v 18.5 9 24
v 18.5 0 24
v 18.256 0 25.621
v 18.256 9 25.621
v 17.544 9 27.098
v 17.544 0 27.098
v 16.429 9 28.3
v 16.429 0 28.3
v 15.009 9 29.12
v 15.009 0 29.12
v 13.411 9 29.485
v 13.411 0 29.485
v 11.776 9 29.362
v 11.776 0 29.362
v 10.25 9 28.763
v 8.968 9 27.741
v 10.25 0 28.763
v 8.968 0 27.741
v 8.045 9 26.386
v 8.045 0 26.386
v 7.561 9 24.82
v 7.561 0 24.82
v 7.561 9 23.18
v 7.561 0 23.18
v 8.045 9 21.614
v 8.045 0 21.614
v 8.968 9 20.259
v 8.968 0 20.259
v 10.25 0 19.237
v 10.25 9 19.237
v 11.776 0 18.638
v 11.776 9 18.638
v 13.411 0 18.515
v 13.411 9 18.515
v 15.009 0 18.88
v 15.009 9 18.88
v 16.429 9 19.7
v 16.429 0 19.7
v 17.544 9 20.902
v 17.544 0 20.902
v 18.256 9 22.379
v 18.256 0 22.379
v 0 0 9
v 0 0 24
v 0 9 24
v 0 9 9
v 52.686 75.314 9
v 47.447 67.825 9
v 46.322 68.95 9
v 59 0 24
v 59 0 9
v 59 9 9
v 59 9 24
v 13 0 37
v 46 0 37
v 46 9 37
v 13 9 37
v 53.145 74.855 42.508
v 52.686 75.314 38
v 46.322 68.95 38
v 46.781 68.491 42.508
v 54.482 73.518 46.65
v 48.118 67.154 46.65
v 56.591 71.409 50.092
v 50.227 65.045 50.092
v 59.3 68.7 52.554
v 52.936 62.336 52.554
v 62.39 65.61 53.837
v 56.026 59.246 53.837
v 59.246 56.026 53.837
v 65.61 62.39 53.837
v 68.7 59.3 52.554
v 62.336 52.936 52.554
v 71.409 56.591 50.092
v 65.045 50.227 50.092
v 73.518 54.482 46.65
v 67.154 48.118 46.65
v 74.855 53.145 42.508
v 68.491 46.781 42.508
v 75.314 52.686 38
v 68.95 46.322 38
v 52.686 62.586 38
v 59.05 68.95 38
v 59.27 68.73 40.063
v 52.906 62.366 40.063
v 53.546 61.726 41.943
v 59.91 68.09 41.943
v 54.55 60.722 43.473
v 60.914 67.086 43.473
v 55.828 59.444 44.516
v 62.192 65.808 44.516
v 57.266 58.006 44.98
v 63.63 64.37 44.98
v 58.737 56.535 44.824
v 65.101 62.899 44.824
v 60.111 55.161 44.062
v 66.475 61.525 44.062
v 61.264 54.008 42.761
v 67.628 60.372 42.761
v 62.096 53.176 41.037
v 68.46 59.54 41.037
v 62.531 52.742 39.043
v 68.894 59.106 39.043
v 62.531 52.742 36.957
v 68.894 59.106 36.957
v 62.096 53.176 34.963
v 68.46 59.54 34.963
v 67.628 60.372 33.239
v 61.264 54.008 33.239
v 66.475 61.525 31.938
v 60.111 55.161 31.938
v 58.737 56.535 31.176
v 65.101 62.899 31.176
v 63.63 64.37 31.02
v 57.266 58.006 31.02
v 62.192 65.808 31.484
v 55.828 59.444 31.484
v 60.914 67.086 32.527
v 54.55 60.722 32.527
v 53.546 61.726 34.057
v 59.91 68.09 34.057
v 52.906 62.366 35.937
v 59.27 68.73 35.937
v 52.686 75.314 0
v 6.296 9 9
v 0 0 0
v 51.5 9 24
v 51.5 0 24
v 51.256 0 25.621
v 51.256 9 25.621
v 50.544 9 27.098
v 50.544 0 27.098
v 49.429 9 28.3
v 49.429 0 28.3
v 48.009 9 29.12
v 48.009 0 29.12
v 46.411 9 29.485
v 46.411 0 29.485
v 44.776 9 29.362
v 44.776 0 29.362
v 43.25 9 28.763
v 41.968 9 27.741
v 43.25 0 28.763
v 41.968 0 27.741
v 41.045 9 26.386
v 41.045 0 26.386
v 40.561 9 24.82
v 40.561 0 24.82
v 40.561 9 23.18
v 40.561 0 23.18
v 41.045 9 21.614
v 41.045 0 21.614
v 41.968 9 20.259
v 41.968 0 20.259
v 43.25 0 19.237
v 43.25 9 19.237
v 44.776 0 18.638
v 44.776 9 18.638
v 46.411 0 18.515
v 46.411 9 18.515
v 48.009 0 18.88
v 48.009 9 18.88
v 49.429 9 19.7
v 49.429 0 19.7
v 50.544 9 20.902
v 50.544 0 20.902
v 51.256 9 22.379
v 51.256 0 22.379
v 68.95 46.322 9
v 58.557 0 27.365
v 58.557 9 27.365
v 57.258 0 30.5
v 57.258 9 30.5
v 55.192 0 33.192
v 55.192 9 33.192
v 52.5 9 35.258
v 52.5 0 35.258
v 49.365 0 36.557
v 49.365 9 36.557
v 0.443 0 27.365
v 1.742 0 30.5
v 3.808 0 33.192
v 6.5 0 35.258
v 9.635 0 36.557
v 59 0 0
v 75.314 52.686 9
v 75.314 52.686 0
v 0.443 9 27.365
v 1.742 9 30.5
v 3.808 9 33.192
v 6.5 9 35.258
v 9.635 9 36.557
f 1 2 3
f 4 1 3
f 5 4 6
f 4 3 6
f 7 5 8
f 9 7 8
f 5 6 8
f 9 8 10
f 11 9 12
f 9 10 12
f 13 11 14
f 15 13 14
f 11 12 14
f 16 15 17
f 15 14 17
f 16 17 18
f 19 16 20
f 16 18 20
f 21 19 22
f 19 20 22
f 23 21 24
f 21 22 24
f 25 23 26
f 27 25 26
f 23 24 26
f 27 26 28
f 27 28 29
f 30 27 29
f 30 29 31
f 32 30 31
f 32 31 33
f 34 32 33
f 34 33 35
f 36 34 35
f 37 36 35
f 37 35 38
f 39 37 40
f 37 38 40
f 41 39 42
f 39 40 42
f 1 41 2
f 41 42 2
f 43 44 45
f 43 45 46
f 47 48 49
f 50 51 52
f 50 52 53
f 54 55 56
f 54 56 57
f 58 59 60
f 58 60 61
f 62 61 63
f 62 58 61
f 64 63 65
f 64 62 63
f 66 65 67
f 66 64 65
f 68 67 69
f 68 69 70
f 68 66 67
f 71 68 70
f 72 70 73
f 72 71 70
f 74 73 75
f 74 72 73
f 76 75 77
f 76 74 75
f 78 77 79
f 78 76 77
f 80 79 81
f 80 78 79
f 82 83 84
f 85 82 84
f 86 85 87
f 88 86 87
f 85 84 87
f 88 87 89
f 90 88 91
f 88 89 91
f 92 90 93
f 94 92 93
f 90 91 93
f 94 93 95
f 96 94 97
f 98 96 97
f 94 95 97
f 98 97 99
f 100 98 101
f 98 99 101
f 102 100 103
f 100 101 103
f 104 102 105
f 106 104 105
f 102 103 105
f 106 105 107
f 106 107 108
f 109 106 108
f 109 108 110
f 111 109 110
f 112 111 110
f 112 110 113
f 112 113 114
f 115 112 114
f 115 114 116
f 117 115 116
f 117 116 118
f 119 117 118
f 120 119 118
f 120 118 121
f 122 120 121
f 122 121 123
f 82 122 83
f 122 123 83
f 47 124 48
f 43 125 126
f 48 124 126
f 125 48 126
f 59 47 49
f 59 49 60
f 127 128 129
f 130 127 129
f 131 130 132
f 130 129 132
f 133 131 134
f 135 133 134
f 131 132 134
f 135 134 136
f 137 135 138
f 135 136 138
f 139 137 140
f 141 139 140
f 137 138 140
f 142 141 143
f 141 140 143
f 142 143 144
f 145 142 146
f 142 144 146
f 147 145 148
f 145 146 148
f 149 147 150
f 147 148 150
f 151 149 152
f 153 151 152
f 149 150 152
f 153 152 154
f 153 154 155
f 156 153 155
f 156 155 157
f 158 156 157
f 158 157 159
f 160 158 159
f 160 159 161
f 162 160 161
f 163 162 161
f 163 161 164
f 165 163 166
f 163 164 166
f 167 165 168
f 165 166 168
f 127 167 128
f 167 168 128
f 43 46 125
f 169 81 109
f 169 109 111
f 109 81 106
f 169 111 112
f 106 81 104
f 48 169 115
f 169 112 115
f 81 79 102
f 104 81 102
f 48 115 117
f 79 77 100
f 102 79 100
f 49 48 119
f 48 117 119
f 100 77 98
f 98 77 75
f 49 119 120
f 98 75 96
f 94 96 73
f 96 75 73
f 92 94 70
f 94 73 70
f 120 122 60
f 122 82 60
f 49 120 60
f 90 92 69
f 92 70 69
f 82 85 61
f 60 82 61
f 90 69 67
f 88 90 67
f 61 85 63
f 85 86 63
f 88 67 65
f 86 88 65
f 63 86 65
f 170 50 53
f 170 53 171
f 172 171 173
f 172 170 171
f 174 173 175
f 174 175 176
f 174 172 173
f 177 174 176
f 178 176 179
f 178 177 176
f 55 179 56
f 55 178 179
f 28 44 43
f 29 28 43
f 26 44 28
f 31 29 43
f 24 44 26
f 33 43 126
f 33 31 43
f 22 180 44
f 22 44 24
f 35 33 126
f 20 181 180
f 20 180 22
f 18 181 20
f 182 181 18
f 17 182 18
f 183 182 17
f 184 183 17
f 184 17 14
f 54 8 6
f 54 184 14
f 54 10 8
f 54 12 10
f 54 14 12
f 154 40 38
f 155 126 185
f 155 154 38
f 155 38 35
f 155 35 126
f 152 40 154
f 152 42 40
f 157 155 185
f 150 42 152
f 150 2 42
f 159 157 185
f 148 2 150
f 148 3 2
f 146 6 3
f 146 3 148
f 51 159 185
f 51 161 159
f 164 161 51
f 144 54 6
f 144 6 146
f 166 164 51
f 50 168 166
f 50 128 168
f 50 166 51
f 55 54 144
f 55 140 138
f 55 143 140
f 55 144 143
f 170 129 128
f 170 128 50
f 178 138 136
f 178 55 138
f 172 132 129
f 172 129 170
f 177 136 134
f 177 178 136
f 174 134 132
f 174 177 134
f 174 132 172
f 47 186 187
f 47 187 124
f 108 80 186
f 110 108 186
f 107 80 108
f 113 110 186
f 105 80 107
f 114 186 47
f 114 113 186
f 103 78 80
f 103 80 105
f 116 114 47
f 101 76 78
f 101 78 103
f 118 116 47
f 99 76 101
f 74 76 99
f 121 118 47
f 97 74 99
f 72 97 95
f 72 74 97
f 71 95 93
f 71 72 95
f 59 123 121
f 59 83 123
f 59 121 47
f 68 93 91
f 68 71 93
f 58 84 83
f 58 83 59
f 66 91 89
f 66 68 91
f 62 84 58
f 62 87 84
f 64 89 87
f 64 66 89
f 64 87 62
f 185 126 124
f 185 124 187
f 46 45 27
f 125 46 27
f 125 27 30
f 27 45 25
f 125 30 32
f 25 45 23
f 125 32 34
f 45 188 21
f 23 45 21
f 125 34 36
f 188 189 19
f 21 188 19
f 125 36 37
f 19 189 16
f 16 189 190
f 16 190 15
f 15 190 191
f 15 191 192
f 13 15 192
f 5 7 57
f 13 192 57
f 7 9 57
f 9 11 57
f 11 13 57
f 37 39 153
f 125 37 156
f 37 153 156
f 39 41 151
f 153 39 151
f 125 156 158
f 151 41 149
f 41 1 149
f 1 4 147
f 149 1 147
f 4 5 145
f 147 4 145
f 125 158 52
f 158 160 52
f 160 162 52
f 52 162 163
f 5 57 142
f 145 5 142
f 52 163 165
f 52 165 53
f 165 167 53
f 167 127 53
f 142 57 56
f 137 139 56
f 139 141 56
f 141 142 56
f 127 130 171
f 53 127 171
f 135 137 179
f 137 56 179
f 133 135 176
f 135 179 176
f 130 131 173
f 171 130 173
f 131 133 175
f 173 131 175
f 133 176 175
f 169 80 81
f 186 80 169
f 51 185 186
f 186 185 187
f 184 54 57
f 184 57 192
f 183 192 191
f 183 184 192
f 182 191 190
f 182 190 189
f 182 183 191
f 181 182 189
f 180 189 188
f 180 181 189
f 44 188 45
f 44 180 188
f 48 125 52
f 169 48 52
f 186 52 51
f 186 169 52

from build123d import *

# Parameters (mm, degrees)
F1_DEPTH = 9
F2_R     = 7
F3_DEPTH = 9
F4_R     = 5.5
F5_DEPTH = 9


with BuildPart() as f1:
    # F0 (on Top) → F1 (new body)
    with BuildSketch(Plane.XY):
        Polygon((52.686291501, 75.313708499), (0, 0), (59, 0), (75.313708499, 52.686291501), align=None)
    extrude(amount=F1_DEPTH)

    # F2 (on face) → F3 (join)
    with BuildSketch(Plane(origin=(64, 64, 0), x_dir=(-0.7071067812, 0.7071067812, 0), z_dir=(0.7071067812, 0.7071067812, 0))):
        with BuildLine():
            Line((-16, 38), (-16, 9))
            Line((-16, 9), (16, 9))
            Line((16, 9), (16, 38))
            ThreePointArc((16, 38), (0, 54), (-16, 38))
        make_face()
        with Locations((0, 38)):
            Circle(F2_R, mode=Mode.SUBTRACT)
    extrude(amount=-F3_DEPTH)

    # F4 (on face) → F5 (join)
    with BuildSketch(Plane.XZ):
        with BuildLine():
            Line((0, 24), (0, 9))
            Line((0, 9), (59, 9))
            Line((59, 9), (59, 24))
            ThreePointArc((59, 24), (55.1923881554, 33.1923881554), (46, 37))
            Line((46, 37), (13, 37))
            ThreePointArc((13, 37), (3.8076118446, 33.1923881554), (0, 24))
        make_face()
        with Locations((13, 24)):
            Circle(F4_R, mode=Mode.SUBTRACT)
        with Locations((46, 24)):
            Circle(F4_R, mode=Mode.SUBTRACT)
    extrude(amount=-F5_DEPTH)


solid = f1.part
